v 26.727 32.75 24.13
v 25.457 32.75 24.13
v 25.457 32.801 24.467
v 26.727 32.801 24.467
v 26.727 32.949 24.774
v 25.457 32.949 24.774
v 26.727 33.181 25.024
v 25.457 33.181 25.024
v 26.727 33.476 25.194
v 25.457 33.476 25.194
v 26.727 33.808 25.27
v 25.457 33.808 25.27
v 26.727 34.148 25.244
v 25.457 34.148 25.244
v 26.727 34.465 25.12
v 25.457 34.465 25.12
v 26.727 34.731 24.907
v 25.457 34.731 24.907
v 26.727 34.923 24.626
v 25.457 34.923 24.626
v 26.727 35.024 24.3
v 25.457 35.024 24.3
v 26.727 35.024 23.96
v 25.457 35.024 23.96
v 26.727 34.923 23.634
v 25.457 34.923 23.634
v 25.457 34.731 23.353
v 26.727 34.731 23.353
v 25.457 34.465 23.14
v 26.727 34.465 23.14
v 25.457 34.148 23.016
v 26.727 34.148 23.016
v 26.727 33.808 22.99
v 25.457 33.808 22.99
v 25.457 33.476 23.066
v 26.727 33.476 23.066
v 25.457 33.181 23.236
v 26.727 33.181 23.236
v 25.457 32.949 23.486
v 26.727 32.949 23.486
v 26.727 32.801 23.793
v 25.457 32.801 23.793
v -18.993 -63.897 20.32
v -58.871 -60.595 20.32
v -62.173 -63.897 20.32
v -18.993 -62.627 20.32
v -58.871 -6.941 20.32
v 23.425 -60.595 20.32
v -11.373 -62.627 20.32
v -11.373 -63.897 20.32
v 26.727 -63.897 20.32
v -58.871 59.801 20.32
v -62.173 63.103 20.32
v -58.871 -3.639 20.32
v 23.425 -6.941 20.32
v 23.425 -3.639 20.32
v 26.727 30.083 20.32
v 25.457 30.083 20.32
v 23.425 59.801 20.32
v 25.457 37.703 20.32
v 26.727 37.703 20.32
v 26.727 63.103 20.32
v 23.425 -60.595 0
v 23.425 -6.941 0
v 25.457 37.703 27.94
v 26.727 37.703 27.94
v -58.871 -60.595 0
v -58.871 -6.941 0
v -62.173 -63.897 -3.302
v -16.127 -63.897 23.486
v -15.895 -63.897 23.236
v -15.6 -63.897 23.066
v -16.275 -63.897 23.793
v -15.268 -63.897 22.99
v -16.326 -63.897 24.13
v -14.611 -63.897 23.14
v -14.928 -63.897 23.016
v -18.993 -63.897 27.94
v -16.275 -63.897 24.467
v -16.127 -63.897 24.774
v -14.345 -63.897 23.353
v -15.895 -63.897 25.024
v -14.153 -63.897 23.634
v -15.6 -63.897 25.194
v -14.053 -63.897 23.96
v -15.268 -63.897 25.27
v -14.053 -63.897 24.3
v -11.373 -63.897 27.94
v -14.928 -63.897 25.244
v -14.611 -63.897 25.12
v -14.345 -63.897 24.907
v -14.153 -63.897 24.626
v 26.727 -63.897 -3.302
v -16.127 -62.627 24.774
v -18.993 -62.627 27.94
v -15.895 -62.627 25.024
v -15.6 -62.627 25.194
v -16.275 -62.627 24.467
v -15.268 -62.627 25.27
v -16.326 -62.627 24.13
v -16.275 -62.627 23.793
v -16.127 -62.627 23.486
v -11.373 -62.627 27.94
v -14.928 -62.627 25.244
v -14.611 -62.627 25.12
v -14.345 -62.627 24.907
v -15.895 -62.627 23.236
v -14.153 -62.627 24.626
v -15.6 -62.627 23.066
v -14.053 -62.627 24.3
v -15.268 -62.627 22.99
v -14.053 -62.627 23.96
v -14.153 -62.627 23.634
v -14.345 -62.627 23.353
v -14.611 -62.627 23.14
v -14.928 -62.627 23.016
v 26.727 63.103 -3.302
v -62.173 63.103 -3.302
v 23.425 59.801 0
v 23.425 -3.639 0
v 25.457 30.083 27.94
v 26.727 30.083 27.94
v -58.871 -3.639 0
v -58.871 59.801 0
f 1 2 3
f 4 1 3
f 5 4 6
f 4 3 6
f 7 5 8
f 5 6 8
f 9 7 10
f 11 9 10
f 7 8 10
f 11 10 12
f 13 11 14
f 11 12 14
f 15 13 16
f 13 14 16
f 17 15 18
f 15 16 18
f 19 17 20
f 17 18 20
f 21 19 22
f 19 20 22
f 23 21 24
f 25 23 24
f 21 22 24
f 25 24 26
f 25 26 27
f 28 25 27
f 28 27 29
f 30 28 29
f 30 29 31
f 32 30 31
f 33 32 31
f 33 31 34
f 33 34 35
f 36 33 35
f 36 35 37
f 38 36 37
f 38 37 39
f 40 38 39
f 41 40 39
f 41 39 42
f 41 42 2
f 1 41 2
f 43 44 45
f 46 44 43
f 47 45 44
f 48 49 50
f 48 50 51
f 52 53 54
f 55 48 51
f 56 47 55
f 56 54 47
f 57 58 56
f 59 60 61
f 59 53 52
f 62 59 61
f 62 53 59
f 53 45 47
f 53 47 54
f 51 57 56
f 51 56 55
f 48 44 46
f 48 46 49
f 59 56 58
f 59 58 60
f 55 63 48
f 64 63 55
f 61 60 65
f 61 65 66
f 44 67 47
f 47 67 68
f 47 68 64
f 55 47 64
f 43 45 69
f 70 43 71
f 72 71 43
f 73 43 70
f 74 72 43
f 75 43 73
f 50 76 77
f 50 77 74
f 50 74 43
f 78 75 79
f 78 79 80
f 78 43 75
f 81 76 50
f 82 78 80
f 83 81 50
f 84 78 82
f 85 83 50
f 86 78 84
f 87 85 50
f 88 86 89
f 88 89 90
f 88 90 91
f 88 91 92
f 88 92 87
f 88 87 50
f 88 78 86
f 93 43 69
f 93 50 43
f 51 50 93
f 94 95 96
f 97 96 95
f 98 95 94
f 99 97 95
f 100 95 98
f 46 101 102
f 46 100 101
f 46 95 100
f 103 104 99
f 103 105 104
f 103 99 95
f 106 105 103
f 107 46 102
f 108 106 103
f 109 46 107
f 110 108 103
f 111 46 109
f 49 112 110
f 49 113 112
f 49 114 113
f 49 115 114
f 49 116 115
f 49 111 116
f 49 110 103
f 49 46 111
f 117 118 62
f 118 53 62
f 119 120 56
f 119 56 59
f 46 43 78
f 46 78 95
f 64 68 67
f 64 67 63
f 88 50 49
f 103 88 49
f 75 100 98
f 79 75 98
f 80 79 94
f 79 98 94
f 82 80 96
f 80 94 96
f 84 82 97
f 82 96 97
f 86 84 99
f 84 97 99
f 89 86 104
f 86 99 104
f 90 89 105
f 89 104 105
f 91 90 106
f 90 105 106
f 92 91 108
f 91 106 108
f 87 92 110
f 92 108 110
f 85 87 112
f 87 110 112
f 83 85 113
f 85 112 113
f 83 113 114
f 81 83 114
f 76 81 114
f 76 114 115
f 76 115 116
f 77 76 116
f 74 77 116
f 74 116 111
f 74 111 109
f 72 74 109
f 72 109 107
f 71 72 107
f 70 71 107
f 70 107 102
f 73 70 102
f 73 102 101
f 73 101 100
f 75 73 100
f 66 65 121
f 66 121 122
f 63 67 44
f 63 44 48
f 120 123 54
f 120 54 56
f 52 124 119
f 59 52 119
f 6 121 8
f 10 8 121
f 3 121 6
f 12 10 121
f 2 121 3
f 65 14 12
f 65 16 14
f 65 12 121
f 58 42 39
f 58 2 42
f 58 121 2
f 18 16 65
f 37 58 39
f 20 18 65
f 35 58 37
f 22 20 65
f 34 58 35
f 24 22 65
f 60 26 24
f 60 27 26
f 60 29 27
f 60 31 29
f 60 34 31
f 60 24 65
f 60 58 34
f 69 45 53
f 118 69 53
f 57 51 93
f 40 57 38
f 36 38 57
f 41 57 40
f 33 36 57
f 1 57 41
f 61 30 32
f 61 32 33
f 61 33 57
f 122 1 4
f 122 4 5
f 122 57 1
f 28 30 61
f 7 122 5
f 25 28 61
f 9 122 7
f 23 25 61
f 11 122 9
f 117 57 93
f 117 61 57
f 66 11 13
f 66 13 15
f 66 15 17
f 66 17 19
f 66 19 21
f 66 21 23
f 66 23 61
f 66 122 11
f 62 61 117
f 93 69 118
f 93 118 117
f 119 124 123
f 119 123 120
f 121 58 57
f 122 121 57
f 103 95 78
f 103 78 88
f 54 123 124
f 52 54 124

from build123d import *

# Parameters (mm, degrees)
F0_W     = 88.9
F0_H     = 127
F0_W_2   = 82.296
F0_H_2   = 53.654046
F0_H_3   = 63.439954
F1_DEPTH = 20.32
F2_DEPTH = 3.302
F3_W     = 1.27
F3_H     = 7.62
F3_W_2   = 7.62
F3_H_2   = 1.27
F4_DEPTH = 7.62
F5_R     = 1.143
F6_DEPTH = 1.271
F7_R     = 1.143
F8_DEPTH = 1.271


with BuildPart() as f1:
    # F0 (on Top) → F1 (new body)
    with BuildSketch(Plane.XY):
        with Locations((-17.722778, -0.396604)):
            Rectangle(F0_W, F0_H)
        with Locations((-17.722778, -33.767581)):
            Rectangle(F0_W_2, F0_H_2, mode=Mode.SUBTRACT)
        with Locations((-17.722778, 28.081419)):
            Rectangle(F0_W_2, F0_H_3, mode=Mode.SUBTRACT)
    extrude(amount=F1_DEPTH)

    # F0 (on Top) → F2 (join)
    with BuildSketch(Plane.XY):
        with Locations((-17.722778, -0.396604)):
            Rectangle(F0_W, F0_H)
        with Locations((-17.722778, -33.767581)):
            Rectangle(F0_W_2, F0_H_2, mode=Mode.SUBTRACT)
        with Locations((-17.722778, 28.081419)):
            Rectangle(F0_W_2, F0_H_3, mode=Mode.SUBTRACT)
        with Locations((-17.722778, 28.081419)):
            Rectangle(F0_W_2, F0_H_3)
        with Locations((-17.722778, -33.767581)):
            Rectangle(F0_W_2, F0_H_2)
    extrude(amount=-F2_DEPTH)

    # F3 (on face) → F4 (join)
    with BuildSketch(Plane.XY.offset(20.32)):
        with Locations((26.092222, 33.893396)):
            Rectangle(F3_W, F3_H)
        with Locations((-15.182778, -63.261604)):
            Rectangle(F3_W_2, F3_H_2)
    extrude(amount=F4_DEPTH)

    # F5 (on face) → F6 (cut, through all)
    with BuildSketch(Plane(origin=(0, -62.626604, 0), x_dir=(-1, 0, 0), z_dir=(0, 1, 0))):
        with Locations((15.182778, 24.13)):
            Circle(F5_R)
    extrude(amount=-F6_DEPTH, mode=Mode.SUBTRACT)

    # F7 (on face) → F8 (cut, through all)
    with BuildSketch(Plane(origin=(25.457222, 0, 0), x_dir=(0, -1, 0), z_dir=(-1, 0, 0))):
        with Locations((-33.893396, 24.13)):
            Circle(F7_R)
    extrude(amount=-F8_DEPTH, mode=Mode.SUBTRACT)


solid = f1.part
